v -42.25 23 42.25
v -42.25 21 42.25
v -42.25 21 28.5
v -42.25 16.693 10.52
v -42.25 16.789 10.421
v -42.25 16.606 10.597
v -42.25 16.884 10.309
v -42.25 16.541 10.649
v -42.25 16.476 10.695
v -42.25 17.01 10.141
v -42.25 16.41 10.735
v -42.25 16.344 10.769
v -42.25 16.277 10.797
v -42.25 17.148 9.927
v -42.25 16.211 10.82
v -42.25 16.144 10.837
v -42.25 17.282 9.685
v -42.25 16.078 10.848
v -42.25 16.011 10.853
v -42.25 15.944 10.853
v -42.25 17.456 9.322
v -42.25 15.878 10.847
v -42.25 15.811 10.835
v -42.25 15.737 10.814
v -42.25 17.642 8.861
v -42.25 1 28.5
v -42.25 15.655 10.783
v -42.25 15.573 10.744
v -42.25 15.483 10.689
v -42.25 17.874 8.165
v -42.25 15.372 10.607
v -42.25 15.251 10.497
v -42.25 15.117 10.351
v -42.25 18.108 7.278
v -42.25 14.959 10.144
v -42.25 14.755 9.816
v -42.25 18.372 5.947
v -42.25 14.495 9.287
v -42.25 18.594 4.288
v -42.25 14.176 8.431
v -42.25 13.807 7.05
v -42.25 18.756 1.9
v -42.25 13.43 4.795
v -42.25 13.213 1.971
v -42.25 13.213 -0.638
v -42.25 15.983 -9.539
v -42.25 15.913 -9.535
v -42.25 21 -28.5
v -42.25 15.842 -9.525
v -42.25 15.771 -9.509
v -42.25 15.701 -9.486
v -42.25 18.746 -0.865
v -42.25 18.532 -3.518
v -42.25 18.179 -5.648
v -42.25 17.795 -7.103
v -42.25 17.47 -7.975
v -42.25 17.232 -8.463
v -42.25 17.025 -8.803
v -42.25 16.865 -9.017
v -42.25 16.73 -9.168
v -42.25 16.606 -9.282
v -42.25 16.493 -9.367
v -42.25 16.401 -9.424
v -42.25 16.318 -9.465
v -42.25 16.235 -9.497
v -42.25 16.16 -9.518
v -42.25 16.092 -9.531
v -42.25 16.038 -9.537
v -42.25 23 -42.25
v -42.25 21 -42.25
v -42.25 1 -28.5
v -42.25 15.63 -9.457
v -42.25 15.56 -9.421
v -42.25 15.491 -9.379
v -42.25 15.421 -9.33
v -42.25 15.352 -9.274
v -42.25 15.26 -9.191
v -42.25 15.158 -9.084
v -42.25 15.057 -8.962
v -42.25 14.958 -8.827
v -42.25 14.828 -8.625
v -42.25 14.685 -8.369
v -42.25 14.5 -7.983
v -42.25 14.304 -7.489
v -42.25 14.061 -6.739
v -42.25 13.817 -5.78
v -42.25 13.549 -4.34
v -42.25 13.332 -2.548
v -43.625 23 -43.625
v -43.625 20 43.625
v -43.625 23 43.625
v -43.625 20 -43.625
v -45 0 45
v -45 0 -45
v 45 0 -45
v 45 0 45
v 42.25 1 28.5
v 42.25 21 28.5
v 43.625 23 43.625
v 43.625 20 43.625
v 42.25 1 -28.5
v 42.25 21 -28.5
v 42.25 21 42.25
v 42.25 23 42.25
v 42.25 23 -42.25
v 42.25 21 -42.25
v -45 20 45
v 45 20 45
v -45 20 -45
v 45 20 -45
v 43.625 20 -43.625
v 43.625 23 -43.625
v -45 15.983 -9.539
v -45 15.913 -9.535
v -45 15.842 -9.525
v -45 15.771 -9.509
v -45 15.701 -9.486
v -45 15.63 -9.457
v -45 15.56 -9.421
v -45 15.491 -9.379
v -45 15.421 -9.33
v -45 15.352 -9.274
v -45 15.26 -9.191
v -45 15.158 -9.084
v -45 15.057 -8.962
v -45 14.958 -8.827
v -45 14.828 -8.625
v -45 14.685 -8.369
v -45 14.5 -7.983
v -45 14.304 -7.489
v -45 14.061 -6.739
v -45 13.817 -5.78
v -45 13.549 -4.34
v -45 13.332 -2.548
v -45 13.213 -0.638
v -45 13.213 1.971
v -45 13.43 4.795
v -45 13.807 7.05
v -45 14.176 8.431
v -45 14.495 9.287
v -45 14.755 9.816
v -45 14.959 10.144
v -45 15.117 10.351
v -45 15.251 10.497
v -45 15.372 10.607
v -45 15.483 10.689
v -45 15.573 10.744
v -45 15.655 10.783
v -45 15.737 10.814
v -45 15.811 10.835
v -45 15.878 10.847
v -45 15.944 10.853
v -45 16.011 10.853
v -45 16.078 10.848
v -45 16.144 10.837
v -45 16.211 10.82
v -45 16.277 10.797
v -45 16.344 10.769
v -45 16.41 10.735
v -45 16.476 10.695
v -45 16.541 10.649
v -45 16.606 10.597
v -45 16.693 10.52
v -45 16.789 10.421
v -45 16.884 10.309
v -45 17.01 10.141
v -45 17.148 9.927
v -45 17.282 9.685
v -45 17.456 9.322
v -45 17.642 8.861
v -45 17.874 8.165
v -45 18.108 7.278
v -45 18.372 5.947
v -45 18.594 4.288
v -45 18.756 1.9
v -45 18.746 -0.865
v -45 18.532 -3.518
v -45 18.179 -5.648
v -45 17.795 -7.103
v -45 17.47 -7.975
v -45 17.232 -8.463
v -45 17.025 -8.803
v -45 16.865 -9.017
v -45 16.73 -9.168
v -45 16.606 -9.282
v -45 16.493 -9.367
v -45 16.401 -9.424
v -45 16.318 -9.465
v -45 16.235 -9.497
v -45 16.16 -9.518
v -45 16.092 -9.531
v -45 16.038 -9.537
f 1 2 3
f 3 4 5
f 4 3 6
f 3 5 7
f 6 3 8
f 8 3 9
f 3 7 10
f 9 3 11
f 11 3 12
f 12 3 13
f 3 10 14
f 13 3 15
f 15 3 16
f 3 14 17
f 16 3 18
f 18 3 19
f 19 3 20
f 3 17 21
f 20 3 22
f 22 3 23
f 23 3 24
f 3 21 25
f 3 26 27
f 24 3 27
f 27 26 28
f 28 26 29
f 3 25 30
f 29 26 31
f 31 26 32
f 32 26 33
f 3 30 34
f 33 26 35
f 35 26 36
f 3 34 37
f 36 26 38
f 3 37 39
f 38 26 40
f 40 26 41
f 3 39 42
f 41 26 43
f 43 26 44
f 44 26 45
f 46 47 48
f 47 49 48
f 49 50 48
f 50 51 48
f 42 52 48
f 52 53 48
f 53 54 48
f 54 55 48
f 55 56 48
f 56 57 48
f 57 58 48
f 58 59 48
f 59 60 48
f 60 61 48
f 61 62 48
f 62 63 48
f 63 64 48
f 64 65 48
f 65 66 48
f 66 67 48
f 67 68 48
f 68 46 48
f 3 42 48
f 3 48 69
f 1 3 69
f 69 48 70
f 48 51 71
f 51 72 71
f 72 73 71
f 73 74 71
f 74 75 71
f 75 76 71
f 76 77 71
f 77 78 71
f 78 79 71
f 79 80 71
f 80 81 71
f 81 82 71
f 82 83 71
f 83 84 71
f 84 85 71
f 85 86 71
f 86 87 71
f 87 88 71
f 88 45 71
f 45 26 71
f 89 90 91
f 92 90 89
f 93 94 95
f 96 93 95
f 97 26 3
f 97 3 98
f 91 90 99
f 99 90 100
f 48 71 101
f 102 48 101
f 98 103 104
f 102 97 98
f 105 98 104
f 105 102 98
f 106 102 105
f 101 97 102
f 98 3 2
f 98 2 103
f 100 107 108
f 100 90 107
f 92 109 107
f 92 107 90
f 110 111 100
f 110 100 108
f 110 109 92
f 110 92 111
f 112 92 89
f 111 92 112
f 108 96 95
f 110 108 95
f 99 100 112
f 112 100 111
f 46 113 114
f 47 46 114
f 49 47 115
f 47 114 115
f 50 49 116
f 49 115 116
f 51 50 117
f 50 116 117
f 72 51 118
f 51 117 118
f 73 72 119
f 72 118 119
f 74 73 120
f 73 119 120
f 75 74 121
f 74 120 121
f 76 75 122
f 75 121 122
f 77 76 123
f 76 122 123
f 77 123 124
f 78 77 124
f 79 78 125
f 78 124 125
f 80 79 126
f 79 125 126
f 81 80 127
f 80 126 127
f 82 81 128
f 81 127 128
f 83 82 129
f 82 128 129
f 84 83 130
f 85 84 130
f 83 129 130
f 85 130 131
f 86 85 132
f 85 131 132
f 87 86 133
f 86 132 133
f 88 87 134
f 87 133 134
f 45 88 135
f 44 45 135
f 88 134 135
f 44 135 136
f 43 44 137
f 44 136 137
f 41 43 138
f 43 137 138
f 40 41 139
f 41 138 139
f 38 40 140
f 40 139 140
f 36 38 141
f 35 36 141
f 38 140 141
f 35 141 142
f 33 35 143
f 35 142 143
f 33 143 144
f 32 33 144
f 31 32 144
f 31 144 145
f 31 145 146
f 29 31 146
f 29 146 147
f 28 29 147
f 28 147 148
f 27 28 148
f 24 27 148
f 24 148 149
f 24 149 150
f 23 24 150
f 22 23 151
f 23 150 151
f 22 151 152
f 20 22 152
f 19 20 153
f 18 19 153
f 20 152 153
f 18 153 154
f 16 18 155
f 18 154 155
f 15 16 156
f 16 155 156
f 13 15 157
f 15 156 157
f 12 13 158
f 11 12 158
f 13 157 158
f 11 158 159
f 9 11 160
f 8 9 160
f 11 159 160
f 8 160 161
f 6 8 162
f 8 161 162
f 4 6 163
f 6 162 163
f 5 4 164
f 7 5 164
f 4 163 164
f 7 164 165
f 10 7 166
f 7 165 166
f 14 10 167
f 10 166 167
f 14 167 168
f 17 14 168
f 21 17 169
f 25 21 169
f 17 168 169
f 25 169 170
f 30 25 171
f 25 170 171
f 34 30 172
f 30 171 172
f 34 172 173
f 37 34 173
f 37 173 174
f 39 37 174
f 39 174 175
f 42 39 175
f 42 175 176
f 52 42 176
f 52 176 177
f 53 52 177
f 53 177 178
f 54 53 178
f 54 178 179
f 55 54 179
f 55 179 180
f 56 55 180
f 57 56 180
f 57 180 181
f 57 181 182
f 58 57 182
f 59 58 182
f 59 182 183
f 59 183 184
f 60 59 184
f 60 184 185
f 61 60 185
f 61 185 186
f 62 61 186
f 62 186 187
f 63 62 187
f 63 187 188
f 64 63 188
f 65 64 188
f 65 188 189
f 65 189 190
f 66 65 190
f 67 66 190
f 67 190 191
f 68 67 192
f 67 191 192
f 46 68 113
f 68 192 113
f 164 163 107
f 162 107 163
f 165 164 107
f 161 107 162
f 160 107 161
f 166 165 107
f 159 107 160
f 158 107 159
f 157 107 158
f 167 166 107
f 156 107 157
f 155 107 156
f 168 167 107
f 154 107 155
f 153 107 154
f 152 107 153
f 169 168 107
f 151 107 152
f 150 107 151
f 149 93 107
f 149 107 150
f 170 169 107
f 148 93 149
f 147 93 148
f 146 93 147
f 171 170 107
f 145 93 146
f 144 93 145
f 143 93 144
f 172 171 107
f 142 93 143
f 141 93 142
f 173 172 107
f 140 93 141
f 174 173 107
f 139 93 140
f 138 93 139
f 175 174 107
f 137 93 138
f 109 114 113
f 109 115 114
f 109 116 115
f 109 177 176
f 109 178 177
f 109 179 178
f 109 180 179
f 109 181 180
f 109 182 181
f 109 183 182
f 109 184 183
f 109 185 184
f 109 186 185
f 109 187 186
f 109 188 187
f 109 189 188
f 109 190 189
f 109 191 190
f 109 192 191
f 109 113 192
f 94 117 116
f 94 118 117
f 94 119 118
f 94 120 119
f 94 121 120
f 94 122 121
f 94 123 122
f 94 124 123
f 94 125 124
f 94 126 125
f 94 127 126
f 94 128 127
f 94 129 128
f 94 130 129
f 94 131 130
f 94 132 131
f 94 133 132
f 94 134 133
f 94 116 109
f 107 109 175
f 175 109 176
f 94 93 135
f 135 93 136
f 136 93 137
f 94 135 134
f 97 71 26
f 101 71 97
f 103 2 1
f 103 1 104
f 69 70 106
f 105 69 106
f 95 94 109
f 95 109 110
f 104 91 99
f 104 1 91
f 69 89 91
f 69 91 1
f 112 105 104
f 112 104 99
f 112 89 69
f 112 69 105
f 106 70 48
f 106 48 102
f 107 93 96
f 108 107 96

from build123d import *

# Parameters (mm, degrees)
SKETCH2_W           = 90
SKETCH2_H           = 90
BOSS_EXTRUDE1_DEPTH = 20
SKETCH5_W           = 84.5
SKETCH5_H           = 84.5
CUT_EXTRUDE2_DEPTH  = 13
SKETCH13_W          = 84.5
SKETCH13_H          = 57
CUT_EXTRUDE5_DEPTH  = 6
SKETCH17_RX         = 10.196247106
SKETCH17_RY         = 2.793572888
CUT_EXTRUDE6_DEPTH  = 2.75
SKETCH25_W          = 84.5
SKETCH25_H          = 13.75
BOSS_EXTRUDE6_DEPTH = 14
SKETCH27_W          = 87.25
SKETCH27_H          = 87.25
SKETCH27_W_2        = 84.5
SKETCH27_H_2        = 84.5
BOSS_EXTRUDE8_DEPTH = 3


with BuildPart() as part:
    # Sketch2 → Boss-Extrude1 (new body)
    with BuildSketch(Plane(origin=(0, 0, 0), x_dir=(1, 0, 0), z_dir=(0, 1, 0))):
        Rectangle(SKETCH2_W, SKETCH2_H)
    extrude(amount=BOSS_EXTRUDE1_DEPTH)

    # Sketch5 → Cut-Extrude2 (cut)
    with BuildSketch(Plane(origin=(0, 20, 0), x_dir=(1, 0, 0), z_dir=(0, 1, 0))):
        Rectangle(SKETCH5_W, SKETCH5_H)
    extrude(amount=-CUT_EXTRUDE2_DEPTH, mode=Mode.SUBTRACT)

    # Sketch13 → Cut-Extrude5 (cut)
    with BuildSketch(Plane(origin=(0, 7, 0), x_dir=(1, 0, 0), z_dir=(0, 1, 0))):
        Rectangle(SKETCH13_W, SKETCH13_H)
    extrude(amount=-CUT_EXTRUDE5_DEPTH, mode=Mode.SUBTRACT)

    # Sketch17 → Cut-Extrude6 (cut)
    with BuildSketch(Plane(origin=(-45, -8.202038474, 0), x_dir=(0, 0, 1), z_dir=(-1, 0, 0))):
        with Locations(Location((0.657720021, 24.185537931), (0, 0, 180))):
            Ellipse(SKETCH17_RX, SKETCH17_RY)
    extrude(amount=-CUT_EXTRUDE6_DEPTH, mode=Mode.SUBTRACT)

    # Sketch25 → Boss-Extrude6 (add)
    with BuildSketch(Plane(origin=(0, 7, 0), x_dir=(1, 0, 0), z_dir=(0, 1, 0))):
        with Locations((0, 35.375)):
            Rectangle(SKETCH25_W, SKETCH25_H)
        with Locations((0, -35.375)):
            Rectangle(SKETCH25_W, SKETCH25_H)
    extrude(amount=BOSS_EXTRUDE6_DEPTH)

    # Sketch27 → Boss-Extrude8 (add)
    with BuildSketch(Plane(origin=(0, 20, 0), x_dir=(1, 0, 0), z_dir=(0, 1, 0))):
        Rectangle(SKETCH27_W, SKETCH27_H)
        Rectangle(SKETCH27_W_2, SKETCH27_H_2, mode=Mode.SUBTRACT)
    extrude(amount=BOSS_EXTRUDE8_DEPTH)


solid = part.part
